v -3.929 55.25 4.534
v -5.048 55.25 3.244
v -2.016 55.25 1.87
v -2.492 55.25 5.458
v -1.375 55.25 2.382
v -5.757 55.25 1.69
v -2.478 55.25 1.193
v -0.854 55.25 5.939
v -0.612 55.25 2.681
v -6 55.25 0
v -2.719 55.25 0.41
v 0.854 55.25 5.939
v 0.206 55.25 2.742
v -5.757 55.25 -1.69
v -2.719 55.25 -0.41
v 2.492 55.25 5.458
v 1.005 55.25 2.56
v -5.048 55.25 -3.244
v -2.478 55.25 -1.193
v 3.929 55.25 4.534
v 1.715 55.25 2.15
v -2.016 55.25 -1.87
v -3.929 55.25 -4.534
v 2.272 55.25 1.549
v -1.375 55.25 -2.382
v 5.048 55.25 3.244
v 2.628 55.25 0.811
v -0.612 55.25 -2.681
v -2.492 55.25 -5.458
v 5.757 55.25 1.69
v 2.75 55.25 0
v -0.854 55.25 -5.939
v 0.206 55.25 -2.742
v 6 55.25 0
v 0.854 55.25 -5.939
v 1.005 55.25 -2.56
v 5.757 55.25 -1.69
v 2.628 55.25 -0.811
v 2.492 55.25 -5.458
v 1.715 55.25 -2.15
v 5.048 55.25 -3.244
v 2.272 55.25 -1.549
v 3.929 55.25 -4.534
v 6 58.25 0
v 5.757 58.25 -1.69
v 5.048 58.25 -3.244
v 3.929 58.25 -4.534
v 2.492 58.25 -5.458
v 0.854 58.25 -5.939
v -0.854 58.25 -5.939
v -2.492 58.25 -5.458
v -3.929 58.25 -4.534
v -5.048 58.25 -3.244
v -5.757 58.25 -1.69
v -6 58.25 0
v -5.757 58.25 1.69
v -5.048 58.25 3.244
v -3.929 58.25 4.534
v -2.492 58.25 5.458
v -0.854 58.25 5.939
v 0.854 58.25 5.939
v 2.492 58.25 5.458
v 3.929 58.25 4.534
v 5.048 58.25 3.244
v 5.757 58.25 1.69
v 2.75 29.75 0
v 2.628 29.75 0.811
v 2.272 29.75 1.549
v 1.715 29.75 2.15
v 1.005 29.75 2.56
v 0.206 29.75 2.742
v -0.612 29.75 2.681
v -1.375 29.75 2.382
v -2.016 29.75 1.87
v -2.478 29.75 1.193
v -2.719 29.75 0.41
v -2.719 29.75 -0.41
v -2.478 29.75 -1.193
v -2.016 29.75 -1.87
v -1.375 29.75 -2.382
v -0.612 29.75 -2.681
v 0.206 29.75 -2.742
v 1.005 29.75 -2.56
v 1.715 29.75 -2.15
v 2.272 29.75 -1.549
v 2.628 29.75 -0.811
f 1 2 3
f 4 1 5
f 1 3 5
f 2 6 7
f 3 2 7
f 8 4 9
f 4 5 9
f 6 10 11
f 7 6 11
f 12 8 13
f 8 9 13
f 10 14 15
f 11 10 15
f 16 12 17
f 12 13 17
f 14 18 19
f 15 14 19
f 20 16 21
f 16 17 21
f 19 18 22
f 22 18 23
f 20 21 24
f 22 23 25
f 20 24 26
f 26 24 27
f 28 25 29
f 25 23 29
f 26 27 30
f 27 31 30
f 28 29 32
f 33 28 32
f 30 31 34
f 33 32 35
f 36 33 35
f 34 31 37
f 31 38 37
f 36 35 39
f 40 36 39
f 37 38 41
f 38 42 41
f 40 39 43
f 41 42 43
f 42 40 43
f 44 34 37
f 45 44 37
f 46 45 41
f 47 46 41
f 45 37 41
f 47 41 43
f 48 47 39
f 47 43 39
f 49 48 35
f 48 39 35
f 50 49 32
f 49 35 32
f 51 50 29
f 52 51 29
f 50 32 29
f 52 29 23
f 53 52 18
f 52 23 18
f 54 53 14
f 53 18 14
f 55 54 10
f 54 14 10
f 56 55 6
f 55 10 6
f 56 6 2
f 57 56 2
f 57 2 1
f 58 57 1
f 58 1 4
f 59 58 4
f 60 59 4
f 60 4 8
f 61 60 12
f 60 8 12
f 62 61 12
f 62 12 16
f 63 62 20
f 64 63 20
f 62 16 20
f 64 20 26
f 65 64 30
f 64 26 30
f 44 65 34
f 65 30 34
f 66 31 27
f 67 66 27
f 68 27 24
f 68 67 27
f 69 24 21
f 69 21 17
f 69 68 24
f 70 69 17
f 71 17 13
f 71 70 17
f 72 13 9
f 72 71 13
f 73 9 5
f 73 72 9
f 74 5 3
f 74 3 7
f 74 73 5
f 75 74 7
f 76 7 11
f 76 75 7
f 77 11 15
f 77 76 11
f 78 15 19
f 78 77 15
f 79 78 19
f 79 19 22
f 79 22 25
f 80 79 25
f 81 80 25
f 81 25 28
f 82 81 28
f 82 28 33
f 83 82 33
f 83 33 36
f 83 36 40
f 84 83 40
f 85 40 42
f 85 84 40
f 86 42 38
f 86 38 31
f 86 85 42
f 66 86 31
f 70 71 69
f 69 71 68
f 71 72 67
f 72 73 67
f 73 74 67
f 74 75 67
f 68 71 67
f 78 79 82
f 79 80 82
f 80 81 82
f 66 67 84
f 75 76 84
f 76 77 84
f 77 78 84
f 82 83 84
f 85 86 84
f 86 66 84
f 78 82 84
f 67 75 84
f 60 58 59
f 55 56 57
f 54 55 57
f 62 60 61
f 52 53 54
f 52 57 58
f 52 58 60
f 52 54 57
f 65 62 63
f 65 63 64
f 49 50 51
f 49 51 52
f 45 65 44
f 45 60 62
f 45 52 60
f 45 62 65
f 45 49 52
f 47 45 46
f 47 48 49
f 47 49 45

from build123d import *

# Parameters (mm, degrees)
SKETCH1_R           = 10
BOSS_EXTRUDE1_DEPTH = 85
SCALE_1_SCALE       = 0.3
SKETCH_1_R          = 6
EXTRUDE_1_DEPTH     = 3
SKETCH_2_R          = 3
SKETCH_2_R_2        = 2.75
CUT_EXTRUDE_1_DEPTH = 25.5


with BuildPart() as part:
    # Sketch1 → Boss-Extrude1 (new body)
    with BuildSketch(Plane(origin=(0, 0, 0), x_dir=(1, 0, 0), z_dir=(0, 1, 0))):
        Circle(SKETCH1_R)
    extrude(amount=BOSS_EXTRUDE1_DEPTH)


with BuildPart() as part_1:
    # 축척1: scaled about (0, 42.5, 0)
    add(part.part.scale(SCALE_1_SCALE).moved(Location((0, 29.75, 0))))

    # 스케치1 → 보스-돌출1 (add)
    with BuildSketch(Plane(origin=(0, 55.25, 0), x_dir=(1, 0, 0), z_dir=(0, 1, 0))):
        Circle(SKETCH_1_R)
    extrude(amount=EXTRUDE_1_DEPTH)

    # 스케치2 → 컷-돌출1 (cut)
    with BuildSketch(Plane.XZ.offset(-29.75)):
        Circle(SKETCH_2_R)
        Circle(SKETCH_2_R_2, mode=Mode.SUBTRACT)
    extrude(amount=-CUT_EXTRUDE_1_DEPTH, mode=Mode.SUBTRACT)


solid = part_1.part
